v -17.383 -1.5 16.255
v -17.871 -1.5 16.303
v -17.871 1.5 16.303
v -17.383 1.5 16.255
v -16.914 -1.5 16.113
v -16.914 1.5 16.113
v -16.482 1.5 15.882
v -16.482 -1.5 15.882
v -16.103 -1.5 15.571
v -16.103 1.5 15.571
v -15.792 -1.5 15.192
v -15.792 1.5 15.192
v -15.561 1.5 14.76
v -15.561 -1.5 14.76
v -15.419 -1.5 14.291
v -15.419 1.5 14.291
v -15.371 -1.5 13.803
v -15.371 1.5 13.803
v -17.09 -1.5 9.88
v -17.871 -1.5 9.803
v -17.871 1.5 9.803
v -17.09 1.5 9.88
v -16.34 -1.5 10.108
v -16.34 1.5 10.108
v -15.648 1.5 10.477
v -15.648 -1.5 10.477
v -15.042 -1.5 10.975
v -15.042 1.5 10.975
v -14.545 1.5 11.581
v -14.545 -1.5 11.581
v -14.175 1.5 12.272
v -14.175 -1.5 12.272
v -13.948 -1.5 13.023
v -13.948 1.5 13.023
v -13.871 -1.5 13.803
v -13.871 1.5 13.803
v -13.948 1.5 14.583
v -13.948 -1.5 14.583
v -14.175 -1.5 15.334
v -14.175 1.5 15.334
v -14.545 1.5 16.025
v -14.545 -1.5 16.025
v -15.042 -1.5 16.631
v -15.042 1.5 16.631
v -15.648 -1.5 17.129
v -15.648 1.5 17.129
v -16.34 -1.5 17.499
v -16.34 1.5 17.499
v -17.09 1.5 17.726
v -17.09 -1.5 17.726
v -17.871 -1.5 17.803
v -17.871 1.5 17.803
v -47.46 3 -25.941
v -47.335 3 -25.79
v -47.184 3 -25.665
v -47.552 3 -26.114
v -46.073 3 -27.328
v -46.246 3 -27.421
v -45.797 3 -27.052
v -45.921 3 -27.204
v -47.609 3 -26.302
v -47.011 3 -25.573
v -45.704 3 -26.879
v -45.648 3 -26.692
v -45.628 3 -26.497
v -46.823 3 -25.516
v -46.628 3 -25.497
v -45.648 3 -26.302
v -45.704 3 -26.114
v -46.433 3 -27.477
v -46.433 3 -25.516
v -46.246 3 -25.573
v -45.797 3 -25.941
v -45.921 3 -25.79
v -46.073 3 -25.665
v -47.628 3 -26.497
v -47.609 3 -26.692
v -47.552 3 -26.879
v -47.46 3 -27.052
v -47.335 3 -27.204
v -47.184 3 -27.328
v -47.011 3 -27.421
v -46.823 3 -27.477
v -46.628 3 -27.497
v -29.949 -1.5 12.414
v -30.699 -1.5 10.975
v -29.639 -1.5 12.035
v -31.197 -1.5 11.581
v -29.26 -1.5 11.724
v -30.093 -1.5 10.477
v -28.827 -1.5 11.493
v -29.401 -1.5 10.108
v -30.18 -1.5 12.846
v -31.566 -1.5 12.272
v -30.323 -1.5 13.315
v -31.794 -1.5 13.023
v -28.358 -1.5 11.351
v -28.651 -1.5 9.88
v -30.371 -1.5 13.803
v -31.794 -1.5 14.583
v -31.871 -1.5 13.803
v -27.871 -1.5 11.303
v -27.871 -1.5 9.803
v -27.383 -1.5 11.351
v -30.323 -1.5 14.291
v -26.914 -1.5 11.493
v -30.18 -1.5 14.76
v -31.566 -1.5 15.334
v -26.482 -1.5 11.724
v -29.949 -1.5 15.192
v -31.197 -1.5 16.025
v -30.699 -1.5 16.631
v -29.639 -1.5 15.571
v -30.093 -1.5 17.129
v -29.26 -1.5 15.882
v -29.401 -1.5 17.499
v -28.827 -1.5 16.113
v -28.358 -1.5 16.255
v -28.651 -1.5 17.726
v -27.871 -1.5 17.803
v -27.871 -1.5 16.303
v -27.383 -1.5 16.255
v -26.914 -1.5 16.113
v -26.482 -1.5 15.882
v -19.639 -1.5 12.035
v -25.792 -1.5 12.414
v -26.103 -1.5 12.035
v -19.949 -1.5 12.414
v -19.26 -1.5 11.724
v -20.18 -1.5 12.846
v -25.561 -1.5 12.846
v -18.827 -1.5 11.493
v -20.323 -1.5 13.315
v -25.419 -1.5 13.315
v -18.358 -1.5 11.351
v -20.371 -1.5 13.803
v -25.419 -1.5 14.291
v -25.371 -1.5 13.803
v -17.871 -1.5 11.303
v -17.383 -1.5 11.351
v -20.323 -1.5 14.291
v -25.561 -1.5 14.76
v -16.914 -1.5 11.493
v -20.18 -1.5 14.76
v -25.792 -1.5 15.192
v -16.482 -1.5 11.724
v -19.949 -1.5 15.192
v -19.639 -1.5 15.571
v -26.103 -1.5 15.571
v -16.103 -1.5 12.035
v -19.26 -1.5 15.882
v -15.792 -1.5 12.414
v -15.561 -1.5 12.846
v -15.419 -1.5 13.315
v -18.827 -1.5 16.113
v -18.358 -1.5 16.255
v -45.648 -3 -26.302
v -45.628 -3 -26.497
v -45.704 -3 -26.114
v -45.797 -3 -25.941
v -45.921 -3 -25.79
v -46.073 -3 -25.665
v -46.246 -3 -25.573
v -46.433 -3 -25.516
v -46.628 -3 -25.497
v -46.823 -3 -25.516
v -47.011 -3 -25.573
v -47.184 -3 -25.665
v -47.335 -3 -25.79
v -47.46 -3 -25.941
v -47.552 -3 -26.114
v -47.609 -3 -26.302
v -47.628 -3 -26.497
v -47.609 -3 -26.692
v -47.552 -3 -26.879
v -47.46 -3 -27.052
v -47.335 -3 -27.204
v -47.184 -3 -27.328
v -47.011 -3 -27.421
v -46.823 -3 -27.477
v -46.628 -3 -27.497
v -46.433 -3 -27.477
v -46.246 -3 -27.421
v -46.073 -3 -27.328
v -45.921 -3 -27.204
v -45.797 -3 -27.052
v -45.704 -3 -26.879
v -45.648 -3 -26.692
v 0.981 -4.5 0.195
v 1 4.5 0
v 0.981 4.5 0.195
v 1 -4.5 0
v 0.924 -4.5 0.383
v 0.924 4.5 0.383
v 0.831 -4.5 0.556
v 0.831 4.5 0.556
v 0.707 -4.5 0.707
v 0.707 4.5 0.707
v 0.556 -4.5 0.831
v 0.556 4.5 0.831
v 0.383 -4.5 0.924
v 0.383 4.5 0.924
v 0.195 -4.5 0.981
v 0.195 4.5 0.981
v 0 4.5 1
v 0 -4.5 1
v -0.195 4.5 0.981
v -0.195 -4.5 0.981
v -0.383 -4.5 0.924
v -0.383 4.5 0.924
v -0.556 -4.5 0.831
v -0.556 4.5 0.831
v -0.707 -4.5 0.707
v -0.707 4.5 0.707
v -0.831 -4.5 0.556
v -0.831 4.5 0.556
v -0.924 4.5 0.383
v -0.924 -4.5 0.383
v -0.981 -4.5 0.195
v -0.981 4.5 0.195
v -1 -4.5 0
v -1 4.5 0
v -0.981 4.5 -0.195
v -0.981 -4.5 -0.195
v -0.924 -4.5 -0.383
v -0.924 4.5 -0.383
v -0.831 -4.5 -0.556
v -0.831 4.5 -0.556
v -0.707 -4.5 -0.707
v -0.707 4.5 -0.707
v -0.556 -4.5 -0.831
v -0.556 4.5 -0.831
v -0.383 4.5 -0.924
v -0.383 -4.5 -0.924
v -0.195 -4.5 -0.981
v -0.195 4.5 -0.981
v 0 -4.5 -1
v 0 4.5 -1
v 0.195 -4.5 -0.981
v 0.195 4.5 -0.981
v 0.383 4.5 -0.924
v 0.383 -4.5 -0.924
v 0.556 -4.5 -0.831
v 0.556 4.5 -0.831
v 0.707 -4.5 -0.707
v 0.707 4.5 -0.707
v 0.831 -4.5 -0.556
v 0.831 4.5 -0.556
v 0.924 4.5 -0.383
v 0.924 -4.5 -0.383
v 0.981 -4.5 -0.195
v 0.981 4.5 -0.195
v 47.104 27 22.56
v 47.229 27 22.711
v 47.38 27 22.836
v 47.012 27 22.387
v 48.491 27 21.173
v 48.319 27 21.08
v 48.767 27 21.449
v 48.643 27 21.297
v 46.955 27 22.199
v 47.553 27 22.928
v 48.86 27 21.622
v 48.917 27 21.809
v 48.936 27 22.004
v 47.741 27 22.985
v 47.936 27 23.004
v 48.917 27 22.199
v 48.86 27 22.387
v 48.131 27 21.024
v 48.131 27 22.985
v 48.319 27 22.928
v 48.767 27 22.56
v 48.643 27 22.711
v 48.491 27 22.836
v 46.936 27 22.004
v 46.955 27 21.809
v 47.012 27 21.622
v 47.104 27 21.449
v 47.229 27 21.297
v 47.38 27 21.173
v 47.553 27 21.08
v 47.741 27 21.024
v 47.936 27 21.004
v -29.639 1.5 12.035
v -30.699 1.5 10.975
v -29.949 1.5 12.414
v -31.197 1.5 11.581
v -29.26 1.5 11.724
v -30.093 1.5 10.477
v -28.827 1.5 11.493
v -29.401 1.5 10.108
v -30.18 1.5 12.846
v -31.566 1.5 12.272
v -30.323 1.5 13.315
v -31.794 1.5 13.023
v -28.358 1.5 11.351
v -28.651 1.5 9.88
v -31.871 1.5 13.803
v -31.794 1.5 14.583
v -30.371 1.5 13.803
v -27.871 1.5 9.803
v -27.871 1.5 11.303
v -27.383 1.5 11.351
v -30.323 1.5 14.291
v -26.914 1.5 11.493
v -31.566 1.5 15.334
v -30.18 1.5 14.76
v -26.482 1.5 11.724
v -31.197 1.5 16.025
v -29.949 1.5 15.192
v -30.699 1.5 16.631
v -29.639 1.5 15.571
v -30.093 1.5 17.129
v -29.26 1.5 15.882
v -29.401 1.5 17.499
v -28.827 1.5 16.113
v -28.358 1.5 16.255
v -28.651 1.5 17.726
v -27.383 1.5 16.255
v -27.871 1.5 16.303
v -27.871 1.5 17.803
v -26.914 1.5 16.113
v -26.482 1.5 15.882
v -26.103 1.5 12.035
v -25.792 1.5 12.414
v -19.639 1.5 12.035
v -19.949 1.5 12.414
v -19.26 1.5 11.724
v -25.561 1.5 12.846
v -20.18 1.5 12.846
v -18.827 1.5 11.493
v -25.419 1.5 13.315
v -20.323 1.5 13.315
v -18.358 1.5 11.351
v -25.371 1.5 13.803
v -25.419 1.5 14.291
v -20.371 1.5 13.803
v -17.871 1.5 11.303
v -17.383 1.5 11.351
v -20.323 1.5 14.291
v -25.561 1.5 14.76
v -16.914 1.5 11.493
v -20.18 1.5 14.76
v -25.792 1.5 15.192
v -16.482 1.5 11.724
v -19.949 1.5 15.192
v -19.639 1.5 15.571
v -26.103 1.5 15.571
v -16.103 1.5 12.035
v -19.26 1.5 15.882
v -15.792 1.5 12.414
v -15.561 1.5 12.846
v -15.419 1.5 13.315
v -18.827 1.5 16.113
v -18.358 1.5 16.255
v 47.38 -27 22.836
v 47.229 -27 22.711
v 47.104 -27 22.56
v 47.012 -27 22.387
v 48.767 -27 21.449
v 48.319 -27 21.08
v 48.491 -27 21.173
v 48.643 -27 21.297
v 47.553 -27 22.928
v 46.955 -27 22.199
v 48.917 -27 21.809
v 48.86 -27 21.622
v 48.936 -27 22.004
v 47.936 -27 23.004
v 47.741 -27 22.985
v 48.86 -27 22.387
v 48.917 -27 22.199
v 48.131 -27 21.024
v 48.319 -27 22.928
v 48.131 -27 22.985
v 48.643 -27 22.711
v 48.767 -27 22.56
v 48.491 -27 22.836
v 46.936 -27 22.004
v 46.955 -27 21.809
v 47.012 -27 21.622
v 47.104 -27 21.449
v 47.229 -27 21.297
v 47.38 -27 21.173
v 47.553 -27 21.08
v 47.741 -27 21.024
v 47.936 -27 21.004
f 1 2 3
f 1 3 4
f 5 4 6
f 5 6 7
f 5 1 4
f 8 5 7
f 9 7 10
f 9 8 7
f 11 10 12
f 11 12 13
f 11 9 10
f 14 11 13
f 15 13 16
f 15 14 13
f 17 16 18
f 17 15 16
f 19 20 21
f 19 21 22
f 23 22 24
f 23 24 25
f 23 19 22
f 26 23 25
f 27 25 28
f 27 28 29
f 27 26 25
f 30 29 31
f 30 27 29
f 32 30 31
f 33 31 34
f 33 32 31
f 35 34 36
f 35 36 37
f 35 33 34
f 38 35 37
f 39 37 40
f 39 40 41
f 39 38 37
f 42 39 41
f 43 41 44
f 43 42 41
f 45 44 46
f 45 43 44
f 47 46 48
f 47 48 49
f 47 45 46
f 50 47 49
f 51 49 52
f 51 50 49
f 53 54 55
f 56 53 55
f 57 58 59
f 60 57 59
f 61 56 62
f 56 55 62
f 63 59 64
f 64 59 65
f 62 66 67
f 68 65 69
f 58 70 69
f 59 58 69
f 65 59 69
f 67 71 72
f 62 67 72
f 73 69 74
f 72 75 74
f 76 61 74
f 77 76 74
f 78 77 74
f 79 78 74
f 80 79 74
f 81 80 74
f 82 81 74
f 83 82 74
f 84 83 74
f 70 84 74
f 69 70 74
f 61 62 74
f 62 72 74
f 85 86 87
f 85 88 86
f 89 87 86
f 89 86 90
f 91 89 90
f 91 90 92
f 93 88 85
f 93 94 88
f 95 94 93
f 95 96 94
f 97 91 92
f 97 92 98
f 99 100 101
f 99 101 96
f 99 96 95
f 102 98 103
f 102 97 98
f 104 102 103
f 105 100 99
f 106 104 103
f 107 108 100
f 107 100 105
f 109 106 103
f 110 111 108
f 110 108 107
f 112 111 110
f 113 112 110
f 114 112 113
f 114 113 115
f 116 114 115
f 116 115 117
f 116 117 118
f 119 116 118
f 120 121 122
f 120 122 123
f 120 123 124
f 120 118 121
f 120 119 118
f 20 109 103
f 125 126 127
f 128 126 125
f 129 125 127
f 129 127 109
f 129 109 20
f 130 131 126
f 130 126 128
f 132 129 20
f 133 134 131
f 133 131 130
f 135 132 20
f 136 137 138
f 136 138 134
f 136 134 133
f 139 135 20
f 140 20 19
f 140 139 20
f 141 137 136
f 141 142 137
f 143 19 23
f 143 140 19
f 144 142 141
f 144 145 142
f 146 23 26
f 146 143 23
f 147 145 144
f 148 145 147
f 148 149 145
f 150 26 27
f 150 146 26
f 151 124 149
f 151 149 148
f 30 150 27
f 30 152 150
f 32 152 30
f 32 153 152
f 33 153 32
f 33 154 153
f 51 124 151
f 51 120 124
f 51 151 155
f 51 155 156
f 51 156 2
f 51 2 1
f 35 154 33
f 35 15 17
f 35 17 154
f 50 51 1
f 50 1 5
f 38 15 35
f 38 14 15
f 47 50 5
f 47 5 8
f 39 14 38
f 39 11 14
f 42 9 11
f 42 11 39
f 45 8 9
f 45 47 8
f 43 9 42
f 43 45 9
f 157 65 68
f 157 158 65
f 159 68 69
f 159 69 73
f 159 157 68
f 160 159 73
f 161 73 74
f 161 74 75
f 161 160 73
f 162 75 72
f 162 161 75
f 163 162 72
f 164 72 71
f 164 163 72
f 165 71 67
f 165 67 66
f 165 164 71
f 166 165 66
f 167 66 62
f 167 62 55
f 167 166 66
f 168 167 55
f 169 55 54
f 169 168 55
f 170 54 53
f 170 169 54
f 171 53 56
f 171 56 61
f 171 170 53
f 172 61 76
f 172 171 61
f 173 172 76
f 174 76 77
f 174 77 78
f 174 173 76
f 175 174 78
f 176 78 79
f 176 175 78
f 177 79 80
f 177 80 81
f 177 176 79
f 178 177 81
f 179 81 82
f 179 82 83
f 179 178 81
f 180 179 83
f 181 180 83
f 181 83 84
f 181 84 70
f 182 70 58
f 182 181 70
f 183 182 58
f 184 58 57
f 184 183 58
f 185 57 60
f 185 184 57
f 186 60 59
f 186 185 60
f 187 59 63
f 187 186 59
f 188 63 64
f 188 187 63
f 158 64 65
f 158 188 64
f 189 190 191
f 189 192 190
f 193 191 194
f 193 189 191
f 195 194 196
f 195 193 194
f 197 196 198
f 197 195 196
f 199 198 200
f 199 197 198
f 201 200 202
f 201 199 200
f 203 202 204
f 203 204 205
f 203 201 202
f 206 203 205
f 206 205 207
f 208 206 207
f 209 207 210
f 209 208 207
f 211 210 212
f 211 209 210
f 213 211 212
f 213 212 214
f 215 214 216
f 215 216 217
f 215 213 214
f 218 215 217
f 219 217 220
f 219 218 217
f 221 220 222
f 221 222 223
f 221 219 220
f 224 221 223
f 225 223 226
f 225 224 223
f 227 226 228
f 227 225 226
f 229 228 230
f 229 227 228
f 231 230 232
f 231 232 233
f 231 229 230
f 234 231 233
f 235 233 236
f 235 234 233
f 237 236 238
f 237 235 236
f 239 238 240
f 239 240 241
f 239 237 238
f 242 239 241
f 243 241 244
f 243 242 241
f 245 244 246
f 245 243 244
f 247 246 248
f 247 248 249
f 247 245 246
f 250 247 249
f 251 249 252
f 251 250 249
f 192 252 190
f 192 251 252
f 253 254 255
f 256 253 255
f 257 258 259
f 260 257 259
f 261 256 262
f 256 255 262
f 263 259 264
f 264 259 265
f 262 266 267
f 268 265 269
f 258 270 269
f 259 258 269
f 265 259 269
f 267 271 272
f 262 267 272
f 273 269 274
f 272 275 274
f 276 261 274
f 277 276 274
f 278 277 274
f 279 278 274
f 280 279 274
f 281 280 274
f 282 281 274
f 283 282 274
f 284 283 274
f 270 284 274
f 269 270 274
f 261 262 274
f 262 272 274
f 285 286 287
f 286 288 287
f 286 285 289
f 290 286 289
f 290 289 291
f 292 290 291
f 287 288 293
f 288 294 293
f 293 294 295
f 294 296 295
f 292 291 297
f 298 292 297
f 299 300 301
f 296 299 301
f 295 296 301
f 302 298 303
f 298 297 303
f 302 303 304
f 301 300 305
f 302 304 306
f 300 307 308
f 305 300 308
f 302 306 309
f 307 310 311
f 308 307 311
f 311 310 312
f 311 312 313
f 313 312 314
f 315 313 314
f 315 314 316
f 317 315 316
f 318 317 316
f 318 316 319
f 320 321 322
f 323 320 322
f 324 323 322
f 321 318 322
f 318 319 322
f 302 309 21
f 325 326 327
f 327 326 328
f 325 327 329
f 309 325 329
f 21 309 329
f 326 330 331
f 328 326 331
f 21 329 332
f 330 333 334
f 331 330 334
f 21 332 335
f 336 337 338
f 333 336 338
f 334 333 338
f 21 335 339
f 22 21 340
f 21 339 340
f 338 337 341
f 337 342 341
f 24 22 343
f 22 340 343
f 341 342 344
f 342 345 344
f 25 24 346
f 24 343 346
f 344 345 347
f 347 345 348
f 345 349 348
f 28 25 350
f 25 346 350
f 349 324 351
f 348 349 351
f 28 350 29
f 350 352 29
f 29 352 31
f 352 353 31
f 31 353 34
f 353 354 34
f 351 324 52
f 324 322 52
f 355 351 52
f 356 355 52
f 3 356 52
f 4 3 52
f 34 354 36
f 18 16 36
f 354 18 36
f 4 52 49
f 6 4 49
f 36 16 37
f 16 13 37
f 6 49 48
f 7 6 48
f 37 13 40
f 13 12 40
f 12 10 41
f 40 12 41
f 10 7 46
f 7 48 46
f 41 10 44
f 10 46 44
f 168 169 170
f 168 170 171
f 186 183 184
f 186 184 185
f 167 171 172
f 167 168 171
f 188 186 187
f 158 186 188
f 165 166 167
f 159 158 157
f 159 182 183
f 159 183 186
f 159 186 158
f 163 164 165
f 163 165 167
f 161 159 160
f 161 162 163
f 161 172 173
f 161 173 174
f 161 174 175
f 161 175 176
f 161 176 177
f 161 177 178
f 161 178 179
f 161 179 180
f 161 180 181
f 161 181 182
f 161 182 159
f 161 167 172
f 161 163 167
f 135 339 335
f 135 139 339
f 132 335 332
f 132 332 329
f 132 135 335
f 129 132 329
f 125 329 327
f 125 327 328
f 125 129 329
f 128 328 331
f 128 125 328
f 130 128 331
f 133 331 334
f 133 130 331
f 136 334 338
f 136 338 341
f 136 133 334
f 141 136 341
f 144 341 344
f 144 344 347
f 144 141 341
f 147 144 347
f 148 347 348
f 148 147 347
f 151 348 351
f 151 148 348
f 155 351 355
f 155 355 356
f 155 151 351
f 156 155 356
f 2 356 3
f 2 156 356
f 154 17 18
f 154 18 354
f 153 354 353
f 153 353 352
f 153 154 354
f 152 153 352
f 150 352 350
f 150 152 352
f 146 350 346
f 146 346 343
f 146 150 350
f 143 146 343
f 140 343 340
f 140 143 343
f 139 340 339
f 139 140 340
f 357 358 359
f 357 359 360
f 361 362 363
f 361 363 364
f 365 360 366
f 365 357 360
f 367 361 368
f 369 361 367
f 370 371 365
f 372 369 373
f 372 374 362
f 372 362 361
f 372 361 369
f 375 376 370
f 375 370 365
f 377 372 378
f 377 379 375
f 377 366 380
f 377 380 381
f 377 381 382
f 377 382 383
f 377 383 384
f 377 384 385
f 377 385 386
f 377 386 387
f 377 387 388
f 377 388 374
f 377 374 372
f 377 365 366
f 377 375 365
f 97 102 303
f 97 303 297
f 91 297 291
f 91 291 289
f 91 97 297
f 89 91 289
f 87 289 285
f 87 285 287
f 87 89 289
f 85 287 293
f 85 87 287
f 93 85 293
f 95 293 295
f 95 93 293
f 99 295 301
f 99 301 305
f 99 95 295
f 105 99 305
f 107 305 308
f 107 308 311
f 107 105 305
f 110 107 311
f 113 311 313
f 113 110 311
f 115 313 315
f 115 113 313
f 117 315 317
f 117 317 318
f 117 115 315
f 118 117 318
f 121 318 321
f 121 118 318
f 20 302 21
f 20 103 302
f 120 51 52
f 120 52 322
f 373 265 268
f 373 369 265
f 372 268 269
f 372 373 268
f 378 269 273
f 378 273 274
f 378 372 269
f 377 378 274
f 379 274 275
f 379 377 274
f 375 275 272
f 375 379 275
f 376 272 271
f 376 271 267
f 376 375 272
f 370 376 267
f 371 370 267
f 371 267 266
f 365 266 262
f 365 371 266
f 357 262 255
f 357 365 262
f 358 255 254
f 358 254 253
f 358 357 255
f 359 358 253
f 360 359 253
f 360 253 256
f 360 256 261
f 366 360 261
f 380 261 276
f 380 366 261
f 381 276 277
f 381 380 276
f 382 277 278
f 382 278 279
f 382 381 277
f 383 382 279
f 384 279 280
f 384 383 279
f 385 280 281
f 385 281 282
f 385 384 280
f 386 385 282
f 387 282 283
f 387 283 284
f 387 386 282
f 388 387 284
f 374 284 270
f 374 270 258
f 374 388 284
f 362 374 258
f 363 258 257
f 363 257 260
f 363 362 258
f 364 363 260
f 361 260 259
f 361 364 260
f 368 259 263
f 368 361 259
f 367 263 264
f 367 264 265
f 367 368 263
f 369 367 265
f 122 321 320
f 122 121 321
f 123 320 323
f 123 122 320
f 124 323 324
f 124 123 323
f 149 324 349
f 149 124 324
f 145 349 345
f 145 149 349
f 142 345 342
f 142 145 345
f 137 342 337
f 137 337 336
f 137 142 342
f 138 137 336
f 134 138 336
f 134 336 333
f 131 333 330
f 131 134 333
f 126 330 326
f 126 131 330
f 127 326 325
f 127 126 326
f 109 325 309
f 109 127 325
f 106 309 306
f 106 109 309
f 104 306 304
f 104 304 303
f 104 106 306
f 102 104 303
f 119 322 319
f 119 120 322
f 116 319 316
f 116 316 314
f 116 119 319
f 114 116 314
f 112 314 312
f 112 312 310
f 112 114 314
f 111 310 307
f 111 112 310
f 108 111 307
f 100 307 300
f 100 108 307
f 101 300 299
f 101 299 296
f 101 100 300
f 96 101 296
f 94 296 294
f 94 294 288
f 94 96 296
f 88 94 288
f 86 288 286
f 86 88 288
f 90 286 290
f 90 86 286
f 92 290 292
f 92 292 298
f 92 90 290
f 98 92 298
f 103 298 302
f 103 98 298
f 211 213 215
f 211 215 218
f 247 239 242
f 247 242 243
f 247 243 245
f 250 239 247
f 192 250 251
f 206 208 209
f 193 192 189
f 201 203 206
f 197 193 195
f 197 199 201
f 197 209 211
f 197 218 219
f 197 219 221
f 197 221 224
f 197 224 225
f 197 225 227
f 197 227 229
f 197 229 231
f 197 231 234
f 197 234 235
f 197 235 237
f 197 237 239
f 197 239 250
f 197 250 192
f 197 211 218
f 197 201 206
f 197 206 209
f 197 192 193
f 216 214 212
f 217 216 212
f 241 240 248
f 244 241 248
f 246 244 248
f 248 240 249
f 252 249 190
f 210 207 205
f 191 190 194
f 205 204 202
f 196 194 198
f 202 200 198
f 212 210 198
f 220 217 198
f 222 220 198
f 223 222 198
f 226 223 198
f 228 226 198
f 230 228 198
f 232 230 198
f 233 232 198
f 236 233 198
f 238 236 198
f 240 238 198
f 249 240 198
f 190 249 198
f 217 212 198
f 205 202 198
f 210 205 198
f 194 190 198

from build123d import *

# Parameters (mm, degrees)
F1_DEPTH = 1.5
F2_R     = 1
F3_DEPTH = 4.5
F4_R     = 1
F5_DEPTH = 27
F6_R     = 1
F7_DEPTH = 3


with BuildPart() as f1:
    # F0 (on Front) → F1 (new body, symmetric)
    with BuildSketch(Plane.XZ):
        with BuildLine():
            Line((-27.870757, 11.30302), (-27.870757, 9.80302))
            Line((-27.870757, 9.80302), (-17.870757, 9.80302))
            Line((-17.870757, 9.80302), (-17.870757, 11.30302))
            ThreePointArc((-17.870757, 11.30302), (-20.370757, 13.80302), (-17.870757, 16.30302))
            Line((-17.870757, 16.30302), (-17.870757, 17.80302))
            Line((-17.870757, 17.80302), (-27.870757, 17.80302))
            Line((-27.870757, 17.80302), (-27.870757, 16.30302))
            ThreePointArc((-27.870757, 16.30302), (-26.10299, 15.570787), (-25.370757, 13.80302))
            ThreePointArc((-25.370757, 13.80302), (-26.10299, 12.035253), (-27.870757, 11.30302))
        make_face()
        with BuildLine():
            Line((-17.870757, 11.30302), (-17.870757, 9.80302))
            ThreePointArc((-17.870757, 9.80302), (-13.870757, 13.80302), (-17.870757, 17.80302))
            Line((-17.870757, 17.80302), (-17.870757, 16.30302))
            ThreePointArc((-17.870757, 16.30302), (-16.10299, 15.570787), (-15.370757, 13.80302))
            ThreePointArc((-15.370757, 13.80302), (-16.10299, 12.035253), (-17.870757, 11.30302))
        make_face()
        with BuildLine():
            ThreePointArc((-27.870757, 17.80302), (-31.870757, 13.80302), (-27.870757, 9.80302))
            Line((-27.870757, 9.80302), (-27.870757, 11.30302))
            ThreePointArc((-27.870757, 11.30302), (-30.370757, 13.80302), (-27.870757, 16.30302))
            Line((-27.870757, 16.30302), (-27.870757, 17.80302))
        make_face()
    extrude(amount=F1_DEPTH, both=True)


with BuildPart() as f3:
    # F2 (on Front) → F3 (new body, symmetric)
    with BuildSketch(Plane.XZ):
        Circle(F2_R)
    extrude(amount=F3_DEPTH, both=True)


with BuildPart() as f5:
    # F4 (on Front) → F5 (new body, symmetric)
    with BuildSketch(Plane.XZ):
        with Locations((47.935918, 22.004351)):
            Circle(F4_R)
    extrude(amount=F5_DEPTH, both=True)


with BuildPart() as f7:
    # F6 (on Front) → F7 (new body, symmetric)
    with BuildSketch(Plane.XZ):
        with Locations((-46.628293, -26.496712)):
            Circle(F6_R)
    extrude(amount=F7_DEPTH, both=True)


solid = Compound([f1.part, f3.part, f5.part, f7.part])
